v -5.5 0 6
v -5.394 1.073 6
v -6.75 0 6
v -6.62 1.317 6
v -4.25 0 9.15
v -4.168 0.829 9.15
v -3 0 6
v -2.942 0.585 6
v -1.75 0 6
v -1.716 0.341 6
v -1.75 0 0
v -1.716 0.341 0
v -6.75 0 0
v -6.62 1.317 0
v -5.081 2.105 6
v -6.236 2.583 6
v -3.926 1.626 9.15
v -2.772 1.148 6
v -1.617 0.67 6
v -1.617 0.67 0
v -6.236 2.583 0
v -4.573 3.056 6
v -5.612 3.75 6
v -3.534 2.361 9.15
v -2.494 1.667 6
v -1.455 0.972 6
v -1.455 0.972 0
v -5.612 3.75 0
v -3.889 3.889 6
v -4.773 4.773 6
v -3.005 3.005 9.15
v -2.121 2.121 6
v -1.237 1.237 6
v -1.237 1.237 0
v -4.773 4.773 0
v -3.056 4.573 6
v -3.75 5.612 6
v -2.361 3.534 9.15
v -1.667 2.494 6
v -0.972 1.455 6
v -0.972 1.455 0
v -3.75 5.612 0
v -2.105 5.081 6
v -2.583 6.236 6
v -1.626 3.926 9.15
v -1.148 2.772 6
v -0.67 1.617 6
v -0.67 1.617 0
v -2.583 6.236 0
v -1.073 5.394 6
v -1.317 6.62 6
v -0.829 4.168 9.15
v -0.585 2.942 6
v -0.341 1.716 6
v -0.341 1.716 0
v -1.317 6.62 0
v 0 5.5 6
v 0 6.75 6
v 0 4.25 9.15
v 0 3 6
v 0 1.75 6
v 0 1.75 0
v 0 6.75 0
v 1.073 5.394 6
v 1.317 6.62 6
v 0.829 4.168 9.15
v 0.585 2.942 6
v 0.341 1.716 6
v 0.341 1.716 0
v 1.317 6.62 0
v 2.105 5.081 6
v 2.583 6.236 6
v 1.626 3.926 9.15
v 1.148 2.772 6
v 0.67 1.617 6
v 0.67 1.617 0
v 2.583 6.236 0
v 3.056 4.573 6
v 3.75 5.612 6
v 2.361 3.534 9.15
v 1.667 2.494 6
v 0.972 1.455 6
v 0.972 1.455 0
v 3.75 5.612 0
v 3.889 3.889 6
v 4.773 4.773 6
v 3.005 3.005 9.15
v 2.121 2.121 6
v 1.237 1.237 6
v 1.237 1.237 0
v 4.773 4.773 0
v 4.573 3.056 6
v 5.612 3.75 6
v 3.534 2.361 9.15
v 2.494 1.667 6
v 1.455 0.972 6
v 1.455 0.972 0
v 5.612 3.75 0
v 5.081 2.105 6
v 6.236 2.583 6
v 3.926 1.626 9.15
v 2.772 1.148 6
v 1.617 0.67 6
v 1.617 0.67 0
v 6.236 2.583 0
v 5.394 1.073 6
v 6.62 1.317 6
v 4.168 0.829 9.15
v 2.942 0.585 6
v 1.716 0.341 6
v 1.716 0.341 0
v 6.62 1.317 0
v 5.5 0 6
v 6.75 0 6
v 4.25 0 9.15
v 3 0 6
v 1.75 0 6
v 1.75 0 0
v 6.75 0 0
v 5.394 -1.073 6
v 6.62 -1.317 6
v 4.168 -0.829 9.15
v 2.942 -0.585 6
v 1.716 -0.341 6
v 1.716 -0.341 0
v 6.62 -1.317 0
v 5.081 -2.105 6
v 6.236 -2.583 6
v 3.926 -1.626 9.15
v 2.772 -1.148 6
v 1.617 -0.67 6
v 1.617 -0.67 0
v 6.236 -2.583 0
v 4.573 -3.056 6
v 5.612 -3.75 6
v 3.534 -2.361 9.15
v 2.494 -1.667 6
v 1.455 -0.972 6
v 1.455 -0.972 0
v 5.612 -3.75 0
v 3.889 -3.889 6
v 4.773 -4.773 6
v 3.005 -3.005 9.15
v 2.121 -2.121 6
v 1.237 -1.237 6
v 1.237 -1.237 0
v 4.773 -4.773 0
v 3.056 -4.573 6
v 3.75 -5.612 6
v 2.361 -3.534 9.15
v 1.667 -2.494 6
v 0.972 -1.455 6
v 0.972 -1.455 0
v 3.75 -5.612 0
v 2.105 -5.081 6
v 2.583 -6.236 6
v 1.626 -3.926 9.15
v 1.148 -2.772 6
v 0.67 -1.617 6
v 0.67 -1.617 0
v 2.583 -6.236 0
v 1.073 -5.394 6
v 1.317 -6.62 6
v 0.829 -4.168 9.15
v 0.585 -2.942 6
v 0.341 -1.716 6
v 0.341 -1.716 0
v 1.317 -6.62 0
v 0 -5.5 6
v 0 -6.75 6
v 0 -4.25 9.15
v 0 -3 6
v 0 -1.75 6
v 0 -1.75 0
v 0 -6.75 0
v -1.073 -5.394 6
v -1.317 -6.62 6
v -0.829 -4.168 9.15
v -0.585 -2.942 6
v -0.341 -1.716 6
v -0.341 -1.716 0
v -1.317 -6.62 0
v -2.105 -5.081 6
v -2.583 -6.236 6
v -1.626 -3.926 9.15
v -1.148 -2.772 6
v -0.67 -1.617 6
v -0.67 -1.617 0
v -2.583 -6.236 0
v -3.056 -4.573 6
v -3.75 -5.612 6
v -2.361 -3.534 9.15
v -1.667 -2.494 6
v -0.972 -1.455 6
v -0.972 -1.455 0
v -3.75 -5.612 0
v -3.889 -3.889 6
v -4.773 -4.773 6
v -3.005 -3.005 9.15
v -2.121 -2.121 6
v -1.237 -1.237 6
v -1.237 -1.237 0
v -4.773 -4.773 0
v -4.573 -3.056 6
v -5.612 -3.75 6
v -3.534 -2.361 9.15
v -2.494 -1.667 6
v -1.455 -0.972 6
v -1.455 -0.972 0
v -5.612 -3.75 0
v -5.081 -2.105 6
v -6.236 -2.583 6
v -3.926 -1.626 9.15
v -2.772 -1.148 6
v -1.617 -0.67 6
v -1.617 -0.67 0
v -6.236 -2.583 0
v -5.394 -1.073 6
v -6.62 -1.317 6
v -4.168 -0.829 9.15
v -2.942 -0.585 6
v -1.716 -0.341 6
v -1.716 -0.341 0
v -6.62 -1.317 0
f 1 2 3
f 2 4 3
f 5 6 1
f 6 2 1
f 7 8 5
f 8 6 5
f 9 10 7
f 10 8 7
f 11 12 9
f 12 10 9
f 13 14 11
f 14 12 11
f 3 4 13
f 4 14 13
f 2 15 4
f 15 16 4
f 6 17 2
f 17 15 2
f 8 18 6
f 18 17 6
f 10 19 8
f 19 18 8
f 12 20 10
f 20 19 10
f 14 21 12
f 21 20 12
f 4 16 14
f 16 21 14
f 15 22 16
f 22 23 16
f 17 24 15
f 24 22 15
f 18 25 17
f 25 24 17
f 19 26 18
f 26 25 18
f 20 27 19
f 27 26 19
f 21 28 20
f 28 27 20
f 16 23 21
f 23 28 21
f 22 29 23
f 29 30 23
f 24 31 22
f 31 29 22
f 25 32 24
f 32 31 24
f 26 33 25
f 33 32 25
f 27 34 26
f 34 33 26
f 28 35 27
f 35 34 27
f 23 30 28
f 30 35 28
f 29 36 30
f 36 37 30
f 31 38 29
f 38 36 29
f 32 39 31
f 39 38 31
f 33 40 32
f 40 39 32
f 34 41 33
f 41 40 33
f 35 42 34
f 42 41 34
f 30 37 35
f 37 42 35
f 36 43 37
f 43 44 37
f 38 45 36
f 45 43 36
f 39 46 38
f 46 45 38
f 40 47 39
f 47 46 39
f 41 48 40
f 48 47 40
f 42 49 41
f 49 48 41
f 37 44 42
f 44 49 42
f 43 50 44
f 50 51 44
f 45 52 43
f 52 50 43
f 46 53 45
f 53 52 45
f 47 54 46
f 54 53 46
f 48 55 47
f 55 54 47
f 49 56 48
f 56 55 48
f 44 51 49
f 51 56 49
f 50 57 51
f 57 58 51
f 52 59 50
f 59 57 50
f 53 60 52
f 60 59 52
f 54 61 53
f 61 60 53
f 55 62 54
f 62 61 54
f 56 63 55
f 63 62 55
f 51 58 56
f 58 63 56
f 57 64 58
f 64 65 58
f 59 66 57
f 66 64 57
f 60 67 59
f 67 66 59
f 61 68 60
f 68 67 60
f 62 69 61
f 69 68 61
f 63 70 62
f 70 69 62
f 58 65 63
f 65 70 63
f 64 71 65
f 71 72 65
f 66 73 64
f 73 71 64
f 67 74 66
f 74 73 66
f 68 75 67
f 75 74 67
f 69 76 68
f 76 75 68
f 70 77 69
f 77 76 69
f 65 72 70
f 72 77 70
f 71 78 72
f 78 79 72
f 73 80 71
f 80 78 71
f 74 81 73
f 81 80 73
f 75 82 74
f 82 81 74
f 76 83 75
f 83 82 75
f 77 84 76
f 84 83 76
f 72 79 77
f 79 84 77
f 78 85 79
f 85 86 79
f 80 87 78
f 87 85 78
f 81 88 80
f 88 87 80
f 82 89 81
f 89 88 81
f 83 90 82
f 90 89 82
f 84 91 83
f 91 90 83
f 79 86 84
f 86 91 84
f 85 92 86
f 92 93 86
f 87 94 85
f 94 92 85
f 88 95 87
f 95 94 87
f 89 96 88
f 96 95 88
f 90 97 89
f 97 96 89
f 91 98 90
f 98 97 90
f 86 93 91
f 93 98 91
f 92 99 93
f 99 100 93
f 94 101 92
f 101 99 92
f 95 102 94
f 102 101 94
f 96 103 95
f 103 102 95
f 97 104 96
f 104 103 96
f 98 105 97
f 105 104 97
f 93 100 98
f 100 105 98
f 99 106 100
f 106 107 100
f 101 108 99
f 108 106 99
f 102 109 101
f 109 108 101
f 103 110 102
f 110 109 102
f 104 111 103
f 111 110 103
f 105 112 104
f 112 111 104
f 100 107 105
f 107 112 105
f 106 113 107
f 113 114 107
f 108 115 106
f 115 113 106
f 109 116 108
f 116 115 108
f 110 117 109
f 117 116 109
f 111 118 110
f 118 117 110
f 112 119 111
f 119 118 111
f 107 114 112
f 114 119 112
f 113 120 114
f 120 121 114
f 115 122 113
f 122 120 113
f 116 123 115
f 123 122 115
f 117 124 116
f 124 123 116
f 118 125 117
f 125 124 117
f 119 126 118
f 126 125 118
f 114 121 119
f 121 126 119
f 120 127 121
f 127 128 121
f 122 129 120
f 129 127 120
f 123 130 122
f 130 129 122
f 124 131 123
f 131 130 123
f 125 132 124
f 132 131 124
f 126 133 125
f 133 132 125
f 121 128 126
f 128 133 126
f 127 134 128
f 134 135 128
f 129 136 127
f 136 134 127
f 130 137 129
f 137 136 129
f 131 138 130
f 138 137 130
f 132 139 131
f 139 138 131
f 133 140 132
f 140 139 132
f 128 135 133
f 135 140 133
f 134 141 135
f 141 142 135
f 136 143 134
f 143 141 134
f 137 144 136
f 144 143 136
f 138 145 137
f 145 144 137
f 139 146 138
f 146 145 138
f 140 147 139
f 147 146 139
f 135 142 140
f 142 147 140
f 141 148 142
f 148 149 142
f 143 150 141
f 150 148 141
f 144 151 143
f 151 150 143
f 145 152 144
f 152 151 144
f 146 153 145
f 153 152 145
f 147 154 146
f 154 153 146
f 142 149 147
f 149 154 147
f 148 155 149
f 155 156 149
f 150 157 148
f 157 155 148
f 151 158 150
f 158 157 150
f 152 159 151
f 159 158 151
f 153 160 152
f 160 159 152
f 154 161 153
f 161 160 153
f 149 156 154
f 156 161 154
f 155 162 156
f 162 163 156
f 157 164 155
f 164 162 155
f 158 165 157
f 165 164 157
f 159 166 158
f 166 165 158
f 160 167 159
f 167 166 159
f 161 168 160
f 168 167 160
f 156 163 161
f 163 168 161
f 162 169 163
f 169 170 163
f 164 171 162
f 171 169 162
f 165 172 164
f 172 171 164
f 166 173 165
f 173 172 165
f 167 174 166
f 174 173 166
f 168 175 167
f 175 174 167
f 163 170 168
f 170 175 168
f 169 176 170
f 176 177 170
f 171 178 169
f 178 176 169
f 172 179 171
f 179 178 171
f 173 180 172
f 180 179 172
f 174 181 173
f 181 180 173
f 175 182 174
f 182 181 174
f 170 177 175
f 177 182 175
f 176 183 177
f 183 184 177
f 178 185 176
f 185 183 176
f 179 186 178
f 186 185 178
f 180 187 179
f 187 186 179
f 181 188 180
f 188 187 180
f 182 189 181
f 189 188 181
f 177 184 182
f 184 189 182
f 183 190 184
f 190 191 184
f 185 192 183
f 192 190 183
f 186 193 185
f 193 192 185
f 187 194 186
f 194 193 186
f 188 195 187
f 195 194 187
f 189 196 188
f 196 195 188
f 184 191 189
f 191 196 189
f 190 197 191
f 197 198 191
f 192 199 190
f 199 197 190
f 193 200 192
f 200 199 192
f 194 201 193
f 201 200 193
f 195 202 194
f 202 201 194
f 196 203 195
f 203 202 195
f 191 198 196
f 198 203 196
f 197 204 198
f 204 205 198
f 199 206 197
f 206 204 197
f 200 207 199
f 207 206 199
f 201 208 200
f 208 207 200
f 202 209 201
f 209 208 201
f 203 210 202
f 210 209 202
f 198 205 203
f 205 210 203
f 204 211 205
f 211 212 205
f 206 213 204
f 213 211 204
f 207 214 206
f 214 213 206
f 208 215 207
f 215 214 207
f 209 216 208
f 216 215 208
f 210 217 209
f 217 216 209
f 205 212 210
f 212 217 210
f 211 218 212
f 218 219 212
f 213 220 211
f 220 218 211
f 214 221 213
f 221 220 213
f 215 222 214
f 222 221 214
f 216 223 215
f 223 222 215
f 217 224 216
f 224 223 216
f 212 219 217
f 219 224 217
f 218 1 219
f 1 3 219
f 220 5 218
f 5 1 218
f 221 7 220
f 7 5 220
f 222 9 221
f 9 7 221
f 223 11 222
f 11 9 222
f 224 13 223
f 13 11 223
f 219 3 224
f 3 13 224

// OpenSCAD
$fn = 32;

// ----------------------------------------------------------------------
// Form washer: domed washer, 13.5 mm outside, 3.5 mm bore
// ----------------------------------------------------------------------

// --- parameters (mm) ---
revolve_angle = 360;      // full turn around the Z axis
profile_points = 7;       // points of the closed outline

profile = [[1.75, 0], [6.75, 0], [6.75, 6], [5.5, 6], [4.25, 9.15], [3, 6], [1.75, 6]];  // single closed polygon, 7 points, counter clockwise

// --- the one profile operation ---
rotate_extrude(angle = revolve_angle) polygon(points = profile);
